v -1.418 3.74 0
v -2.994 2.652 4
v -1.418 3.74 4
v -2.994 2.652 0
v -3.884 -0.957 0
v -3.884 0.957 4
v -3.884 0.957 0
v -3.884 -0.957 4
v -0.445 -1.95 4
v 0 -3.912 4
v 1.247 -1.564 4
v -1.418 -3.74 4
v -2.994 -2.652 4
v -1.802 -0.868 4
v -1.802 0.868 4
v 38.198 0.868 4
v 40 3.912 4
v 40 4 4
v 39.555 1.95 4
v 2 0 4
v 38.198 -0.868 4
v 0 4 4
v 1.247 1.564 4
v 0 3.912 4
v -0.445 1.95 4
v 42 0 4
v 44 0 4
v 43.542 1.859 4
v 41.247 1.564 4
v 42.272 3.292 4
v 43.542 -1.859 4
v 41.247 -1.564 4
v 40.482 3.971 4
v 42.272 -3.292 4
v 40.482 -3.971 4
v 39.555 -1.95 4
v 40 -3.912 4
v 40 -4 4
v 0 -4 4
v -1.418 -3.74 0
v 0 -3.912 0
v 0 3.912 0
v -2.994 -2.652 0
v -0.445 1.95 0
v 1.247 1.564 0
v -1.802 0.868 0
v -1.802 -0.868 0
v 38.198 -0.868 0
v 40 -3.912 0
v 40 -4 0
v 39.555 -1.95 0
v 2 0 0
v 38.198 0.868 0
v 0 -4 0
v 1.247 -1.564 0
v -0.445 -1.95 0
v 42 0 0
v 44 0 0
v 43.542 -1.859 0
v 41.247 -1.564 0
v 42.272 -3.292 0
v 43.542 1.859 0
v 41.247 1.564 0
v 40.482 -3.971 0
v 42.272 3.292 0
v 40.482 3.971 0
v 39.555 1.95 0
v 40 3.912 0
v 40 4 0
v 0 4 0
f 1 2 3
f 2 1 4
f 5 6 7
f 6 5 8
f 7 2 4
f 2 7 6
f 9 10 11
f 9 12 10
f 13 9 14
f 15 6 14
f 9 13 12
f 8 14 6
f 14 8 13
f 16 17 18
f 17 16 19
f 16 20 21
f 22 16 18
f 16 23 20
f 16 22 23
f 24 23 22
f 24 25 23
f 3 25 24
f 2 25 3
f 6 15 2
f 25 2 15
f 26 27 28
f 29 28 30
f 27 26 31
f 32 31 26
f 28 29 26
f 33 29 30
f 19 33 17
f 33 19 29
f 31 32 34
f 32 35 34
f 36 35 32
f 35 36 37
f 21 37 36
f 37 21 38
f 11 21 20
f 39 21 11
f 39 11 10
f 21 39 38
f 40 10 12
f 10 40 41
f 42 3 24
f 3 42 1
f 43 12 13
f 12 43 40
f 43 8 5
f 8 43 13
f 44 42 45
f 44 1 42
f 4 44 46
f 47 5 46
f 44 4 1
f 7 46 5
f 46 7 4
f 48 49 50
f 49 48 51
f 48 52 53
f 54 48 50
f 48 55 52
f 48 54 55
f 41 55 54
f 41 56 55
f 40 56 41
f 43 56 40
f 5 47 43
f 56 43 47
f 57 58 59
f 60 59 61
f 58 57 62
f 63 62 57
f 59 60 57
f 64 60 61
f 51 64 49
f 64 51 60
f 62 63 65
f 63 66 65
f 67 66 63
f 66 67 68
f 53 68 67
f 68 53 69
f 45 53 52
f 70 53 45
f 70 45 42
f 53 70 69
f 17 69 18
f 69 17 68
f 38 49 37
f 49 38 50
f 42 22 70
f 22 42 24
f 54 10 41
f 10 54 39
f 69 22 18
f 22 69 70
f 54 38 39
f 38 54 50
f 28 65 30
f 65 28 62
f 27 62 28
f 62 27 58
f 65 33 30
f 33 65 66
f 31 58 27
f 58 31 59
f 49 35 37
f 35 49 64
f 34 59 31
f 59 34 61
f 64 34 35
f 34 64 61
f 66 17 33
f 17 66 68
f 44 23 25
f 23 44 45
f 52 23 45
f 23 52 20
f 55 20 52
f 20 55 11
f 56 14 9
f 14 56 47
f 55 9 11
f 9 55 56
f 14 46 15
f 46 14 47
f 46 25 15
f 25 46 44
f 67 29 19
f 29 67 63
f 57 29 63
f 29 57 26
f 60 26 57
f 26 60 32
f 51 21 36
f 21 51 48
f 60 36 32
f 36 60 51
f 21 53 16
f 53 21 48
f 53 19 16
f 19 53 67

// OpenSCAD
difference(){
    union(){
        cylinder(4, d=8, center=false);

        translate([0, -4, 0]){
            cube([40, 8, 4], center=false);
        }

        translate([40, 0, 0]){
            cylinder(4, d=8, center=false);
        }
    }
    
    union(){
        translate([0, 0, -1]){
            cylinder(6, d=4, center=false);
            
            translate([40, 0, 0]){
                cylinder(6, d=4, center=false);
            }
        }
    }
}
